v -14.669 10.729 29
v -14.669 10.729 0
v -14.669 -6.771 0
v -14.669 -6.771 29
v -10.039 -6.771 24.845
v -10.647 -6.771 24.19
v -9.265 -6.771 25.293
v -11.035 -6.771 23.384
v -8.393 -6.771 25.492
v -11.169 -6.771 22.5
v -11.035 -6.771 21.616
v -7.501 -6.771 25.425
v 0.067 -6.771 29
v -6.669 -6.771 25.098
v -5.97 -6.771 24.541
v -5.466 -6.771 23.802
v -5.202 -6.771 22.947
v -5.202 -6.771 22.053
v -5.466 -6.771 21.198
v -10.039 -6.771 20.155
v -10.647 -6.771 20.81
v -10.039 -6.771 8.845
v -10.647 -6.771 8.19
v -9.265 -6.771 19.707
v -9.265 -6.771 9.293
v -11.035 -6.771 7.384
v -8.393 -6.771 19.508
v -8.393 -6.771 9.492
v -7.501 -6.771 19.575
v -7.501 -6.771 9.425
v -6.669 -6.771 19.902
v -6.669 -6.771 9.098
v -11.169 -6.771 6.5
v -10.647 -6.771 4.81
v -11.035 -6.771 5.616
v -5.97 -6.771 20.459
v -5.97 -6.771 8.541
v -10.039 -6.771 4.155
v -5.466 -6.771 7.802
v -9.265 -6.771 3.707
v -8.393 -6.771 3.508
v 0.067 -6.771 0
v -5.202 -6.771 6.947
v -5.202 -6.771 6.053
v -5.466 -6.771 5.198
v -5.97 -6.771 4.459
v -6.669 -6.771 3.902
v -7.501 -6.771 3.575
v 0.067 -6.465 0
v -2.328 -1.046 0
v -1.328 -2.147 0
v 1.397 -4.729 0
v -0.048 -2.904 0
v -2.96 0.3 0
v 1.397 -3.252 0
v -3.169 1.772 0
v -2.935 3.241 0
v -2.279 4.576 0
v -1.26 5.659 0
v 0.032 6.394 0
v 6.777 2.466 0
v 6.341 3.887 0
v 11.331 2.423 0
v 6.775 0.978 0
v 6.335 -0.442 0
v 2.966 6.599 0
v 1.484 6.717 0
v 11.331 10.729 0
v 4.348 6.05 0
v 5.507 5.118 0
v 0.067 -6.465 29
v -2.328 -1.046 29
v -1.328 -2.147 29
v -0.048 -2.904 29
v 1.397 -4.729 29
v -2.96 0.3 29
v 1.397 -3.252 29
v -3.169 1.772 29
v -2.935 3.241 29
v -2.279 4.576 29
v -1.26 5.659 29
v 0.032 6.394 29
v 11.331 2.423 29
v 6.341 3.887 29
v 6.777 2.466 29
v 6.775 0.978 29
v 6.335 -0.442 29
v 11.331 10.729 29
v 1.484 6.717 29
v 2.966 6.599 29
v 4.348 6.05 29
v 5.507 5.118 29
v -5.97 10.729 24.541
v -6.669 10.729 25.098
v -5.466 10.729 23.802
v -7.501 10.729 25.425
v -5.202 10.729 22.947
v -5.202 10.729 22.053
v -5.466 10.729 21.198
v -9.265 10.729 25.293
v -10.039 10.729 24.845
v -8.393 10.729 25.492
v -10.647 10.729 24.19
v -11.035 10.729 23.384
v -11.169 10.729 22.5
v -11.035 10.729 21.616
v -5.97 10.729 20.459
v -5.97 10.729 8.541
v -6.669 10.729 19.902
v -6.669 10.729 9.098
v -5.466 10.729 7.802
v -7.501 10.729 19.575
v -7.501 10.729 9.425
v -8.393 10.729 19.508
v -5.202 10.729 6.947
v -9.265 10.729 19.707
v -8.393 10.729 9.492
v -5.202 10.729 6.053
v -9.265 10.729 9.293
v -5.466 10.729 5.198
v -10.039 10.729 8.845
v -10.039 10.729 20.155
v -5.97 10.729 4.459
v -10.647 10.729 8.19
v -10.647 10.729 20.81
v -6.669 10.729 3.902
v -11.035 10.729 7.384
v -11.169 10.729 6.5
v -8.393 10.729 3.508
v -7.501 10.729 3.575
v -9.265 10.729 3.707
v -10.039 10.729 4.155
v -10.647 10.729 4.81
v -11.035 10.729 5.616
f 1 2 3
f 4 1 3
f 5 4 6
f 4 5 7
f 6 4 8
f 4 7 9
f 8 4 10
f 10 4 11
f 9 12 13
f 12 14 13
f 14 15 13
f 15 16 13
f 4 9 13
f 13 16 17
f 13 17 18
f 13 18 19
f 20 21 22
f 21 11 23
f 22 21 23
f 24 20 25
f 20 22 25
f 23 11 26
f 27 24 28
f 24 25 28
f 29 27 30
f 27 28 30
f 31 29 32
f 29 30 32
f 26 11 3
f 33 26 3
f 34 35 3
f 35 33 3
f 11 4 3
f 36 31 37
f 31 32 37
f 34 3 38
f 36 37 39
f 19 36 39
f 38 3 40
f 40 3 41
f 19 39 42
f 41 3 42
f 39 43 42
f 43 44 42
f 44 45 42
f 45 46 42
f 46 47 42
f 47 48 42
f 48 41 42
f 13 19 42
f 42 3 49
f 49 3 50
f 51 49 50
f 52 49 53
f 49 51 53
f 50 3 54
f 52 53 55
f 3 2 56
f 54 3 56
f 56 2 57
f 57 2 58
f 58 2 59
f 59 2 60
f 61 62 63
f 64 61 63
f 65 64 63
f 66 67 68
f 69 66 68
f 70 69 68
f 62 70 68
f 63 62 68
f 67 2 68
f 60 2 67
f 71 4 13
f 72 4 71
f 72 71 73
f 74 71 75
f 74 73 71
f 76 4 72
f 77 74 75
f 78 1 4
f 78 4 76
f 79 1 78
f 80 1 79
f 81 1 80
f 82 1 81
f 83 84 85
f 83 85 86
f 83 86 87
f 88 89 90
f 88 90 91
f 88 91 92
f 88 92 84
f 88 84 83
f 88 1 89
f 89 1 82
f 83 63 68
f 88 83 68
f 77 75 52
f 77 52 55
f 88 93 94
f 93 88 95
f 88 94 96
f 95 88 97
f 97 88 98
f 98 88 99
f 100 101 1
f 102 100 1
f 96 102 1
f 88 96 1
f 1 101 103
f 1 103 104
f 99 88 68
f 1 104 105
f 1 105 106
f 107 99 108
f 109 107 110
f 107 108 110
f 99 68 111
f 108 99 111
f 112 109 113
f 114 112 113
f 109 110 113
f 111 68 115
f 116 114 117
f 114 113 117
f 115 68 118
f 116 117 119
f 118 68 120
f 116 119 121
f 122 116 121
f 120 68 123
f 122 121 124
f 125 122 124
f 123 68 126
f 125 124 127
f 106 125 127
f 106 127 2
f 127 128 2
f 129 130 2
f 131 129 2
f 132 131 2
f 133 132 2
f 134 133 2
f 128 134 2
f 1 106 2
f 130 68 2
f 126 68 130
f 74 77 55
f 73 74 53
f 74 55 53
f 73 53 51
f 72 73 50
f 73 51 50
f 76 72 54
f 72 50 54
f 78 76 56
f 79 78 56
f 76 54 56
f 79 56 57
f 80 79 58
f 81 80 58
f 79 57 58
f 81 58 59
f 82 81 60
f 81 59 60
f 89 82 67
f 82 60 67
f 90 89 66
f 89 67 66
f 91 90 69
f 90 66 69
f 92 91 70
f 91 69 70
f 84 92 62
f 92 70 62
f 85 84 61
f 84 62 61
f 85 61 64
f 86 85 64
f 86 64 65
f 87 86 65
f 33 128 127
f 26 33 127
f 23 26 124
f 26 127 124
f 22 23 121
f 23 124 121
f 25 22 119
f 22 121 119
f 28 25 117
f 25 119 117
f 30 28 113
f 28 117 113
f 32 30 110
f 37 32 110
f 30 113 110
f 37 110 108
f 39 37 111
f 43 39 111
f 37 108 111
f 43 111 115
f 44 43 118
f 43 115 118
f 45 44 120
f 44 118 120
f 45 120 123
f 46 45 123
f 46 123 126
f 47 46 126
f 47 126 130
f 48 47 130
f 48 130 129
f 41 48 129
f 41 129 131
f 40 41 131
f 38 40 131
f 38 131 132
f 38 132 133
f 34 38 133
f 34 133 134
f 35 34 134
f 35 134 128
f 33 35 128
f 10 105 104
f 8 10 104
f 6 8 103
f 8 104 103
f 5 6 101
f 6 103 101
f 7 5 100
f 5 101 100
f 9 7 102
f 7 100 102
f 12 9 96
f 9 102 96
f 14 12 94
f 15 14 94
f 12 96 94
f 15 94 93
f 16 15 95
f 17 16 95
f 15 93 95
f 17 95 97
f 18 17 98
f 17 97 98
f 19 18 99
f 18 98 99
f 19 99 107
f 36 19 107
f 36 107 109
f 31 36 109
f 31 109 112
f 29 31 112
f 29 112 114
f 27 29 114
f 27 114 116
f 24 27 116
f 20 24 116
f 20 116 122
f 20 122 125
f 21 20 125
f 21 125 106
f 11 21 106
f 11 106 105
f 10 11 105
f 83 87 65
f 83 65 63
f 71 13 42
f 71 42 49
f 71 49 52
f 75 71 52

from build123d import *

# Parameters (mm, degrees)
F1_DEPTH = 29
F2_R     = 3
F3_DEPTH = 17.501


with BuildPart() as f1:
    # F0 (on Top) → F1 (new body)
    with BuildSketch(Plane.XY):
        with BuildLine():
            ThreePointArc((1.397452, -3.25215), (-0.64173, 6.074606), (6.33527, -0.44215))
            Line((6.33527, -0.44215), (11.331258, 2.423141))
            Line((11.331258, 2.423141), (11.331258, 10.728996))
            Line((11.331258, 10.728996), (-14.668742, 10.728996))
            Line((-14.668742, 10.728996), (-14.668742, -6.771004))
            Line((-14.668742, -6.771004), (0.066813, -6.771004))
            Line((0.066813, -6.771004), (0.066813, -6.465031))
            Line((0.066813, -6.465031), (1.397452, -4.728965))
            Line((1.397452, -4.728965), (1.397452, -3.25215))
        make_face()
    extrude(amount=F1_DEPTH)

    # F2 (on face) → F3 (cut, through all)
    with BuildSketch(Plane(origin=(0, 10.728996, 0), x_dir=(-1, 0, 0), z_dir=(0, 1, 0))):
        with Locations((8.168742, 22.5)):
            Circle(F2_R)
        with Locations((8.168742, 6.5)):
            Circle(F2_R)
    extrude(amount=-F3_DEPTH, mode=Mode.SUBTRACT)


solid = f1.part
